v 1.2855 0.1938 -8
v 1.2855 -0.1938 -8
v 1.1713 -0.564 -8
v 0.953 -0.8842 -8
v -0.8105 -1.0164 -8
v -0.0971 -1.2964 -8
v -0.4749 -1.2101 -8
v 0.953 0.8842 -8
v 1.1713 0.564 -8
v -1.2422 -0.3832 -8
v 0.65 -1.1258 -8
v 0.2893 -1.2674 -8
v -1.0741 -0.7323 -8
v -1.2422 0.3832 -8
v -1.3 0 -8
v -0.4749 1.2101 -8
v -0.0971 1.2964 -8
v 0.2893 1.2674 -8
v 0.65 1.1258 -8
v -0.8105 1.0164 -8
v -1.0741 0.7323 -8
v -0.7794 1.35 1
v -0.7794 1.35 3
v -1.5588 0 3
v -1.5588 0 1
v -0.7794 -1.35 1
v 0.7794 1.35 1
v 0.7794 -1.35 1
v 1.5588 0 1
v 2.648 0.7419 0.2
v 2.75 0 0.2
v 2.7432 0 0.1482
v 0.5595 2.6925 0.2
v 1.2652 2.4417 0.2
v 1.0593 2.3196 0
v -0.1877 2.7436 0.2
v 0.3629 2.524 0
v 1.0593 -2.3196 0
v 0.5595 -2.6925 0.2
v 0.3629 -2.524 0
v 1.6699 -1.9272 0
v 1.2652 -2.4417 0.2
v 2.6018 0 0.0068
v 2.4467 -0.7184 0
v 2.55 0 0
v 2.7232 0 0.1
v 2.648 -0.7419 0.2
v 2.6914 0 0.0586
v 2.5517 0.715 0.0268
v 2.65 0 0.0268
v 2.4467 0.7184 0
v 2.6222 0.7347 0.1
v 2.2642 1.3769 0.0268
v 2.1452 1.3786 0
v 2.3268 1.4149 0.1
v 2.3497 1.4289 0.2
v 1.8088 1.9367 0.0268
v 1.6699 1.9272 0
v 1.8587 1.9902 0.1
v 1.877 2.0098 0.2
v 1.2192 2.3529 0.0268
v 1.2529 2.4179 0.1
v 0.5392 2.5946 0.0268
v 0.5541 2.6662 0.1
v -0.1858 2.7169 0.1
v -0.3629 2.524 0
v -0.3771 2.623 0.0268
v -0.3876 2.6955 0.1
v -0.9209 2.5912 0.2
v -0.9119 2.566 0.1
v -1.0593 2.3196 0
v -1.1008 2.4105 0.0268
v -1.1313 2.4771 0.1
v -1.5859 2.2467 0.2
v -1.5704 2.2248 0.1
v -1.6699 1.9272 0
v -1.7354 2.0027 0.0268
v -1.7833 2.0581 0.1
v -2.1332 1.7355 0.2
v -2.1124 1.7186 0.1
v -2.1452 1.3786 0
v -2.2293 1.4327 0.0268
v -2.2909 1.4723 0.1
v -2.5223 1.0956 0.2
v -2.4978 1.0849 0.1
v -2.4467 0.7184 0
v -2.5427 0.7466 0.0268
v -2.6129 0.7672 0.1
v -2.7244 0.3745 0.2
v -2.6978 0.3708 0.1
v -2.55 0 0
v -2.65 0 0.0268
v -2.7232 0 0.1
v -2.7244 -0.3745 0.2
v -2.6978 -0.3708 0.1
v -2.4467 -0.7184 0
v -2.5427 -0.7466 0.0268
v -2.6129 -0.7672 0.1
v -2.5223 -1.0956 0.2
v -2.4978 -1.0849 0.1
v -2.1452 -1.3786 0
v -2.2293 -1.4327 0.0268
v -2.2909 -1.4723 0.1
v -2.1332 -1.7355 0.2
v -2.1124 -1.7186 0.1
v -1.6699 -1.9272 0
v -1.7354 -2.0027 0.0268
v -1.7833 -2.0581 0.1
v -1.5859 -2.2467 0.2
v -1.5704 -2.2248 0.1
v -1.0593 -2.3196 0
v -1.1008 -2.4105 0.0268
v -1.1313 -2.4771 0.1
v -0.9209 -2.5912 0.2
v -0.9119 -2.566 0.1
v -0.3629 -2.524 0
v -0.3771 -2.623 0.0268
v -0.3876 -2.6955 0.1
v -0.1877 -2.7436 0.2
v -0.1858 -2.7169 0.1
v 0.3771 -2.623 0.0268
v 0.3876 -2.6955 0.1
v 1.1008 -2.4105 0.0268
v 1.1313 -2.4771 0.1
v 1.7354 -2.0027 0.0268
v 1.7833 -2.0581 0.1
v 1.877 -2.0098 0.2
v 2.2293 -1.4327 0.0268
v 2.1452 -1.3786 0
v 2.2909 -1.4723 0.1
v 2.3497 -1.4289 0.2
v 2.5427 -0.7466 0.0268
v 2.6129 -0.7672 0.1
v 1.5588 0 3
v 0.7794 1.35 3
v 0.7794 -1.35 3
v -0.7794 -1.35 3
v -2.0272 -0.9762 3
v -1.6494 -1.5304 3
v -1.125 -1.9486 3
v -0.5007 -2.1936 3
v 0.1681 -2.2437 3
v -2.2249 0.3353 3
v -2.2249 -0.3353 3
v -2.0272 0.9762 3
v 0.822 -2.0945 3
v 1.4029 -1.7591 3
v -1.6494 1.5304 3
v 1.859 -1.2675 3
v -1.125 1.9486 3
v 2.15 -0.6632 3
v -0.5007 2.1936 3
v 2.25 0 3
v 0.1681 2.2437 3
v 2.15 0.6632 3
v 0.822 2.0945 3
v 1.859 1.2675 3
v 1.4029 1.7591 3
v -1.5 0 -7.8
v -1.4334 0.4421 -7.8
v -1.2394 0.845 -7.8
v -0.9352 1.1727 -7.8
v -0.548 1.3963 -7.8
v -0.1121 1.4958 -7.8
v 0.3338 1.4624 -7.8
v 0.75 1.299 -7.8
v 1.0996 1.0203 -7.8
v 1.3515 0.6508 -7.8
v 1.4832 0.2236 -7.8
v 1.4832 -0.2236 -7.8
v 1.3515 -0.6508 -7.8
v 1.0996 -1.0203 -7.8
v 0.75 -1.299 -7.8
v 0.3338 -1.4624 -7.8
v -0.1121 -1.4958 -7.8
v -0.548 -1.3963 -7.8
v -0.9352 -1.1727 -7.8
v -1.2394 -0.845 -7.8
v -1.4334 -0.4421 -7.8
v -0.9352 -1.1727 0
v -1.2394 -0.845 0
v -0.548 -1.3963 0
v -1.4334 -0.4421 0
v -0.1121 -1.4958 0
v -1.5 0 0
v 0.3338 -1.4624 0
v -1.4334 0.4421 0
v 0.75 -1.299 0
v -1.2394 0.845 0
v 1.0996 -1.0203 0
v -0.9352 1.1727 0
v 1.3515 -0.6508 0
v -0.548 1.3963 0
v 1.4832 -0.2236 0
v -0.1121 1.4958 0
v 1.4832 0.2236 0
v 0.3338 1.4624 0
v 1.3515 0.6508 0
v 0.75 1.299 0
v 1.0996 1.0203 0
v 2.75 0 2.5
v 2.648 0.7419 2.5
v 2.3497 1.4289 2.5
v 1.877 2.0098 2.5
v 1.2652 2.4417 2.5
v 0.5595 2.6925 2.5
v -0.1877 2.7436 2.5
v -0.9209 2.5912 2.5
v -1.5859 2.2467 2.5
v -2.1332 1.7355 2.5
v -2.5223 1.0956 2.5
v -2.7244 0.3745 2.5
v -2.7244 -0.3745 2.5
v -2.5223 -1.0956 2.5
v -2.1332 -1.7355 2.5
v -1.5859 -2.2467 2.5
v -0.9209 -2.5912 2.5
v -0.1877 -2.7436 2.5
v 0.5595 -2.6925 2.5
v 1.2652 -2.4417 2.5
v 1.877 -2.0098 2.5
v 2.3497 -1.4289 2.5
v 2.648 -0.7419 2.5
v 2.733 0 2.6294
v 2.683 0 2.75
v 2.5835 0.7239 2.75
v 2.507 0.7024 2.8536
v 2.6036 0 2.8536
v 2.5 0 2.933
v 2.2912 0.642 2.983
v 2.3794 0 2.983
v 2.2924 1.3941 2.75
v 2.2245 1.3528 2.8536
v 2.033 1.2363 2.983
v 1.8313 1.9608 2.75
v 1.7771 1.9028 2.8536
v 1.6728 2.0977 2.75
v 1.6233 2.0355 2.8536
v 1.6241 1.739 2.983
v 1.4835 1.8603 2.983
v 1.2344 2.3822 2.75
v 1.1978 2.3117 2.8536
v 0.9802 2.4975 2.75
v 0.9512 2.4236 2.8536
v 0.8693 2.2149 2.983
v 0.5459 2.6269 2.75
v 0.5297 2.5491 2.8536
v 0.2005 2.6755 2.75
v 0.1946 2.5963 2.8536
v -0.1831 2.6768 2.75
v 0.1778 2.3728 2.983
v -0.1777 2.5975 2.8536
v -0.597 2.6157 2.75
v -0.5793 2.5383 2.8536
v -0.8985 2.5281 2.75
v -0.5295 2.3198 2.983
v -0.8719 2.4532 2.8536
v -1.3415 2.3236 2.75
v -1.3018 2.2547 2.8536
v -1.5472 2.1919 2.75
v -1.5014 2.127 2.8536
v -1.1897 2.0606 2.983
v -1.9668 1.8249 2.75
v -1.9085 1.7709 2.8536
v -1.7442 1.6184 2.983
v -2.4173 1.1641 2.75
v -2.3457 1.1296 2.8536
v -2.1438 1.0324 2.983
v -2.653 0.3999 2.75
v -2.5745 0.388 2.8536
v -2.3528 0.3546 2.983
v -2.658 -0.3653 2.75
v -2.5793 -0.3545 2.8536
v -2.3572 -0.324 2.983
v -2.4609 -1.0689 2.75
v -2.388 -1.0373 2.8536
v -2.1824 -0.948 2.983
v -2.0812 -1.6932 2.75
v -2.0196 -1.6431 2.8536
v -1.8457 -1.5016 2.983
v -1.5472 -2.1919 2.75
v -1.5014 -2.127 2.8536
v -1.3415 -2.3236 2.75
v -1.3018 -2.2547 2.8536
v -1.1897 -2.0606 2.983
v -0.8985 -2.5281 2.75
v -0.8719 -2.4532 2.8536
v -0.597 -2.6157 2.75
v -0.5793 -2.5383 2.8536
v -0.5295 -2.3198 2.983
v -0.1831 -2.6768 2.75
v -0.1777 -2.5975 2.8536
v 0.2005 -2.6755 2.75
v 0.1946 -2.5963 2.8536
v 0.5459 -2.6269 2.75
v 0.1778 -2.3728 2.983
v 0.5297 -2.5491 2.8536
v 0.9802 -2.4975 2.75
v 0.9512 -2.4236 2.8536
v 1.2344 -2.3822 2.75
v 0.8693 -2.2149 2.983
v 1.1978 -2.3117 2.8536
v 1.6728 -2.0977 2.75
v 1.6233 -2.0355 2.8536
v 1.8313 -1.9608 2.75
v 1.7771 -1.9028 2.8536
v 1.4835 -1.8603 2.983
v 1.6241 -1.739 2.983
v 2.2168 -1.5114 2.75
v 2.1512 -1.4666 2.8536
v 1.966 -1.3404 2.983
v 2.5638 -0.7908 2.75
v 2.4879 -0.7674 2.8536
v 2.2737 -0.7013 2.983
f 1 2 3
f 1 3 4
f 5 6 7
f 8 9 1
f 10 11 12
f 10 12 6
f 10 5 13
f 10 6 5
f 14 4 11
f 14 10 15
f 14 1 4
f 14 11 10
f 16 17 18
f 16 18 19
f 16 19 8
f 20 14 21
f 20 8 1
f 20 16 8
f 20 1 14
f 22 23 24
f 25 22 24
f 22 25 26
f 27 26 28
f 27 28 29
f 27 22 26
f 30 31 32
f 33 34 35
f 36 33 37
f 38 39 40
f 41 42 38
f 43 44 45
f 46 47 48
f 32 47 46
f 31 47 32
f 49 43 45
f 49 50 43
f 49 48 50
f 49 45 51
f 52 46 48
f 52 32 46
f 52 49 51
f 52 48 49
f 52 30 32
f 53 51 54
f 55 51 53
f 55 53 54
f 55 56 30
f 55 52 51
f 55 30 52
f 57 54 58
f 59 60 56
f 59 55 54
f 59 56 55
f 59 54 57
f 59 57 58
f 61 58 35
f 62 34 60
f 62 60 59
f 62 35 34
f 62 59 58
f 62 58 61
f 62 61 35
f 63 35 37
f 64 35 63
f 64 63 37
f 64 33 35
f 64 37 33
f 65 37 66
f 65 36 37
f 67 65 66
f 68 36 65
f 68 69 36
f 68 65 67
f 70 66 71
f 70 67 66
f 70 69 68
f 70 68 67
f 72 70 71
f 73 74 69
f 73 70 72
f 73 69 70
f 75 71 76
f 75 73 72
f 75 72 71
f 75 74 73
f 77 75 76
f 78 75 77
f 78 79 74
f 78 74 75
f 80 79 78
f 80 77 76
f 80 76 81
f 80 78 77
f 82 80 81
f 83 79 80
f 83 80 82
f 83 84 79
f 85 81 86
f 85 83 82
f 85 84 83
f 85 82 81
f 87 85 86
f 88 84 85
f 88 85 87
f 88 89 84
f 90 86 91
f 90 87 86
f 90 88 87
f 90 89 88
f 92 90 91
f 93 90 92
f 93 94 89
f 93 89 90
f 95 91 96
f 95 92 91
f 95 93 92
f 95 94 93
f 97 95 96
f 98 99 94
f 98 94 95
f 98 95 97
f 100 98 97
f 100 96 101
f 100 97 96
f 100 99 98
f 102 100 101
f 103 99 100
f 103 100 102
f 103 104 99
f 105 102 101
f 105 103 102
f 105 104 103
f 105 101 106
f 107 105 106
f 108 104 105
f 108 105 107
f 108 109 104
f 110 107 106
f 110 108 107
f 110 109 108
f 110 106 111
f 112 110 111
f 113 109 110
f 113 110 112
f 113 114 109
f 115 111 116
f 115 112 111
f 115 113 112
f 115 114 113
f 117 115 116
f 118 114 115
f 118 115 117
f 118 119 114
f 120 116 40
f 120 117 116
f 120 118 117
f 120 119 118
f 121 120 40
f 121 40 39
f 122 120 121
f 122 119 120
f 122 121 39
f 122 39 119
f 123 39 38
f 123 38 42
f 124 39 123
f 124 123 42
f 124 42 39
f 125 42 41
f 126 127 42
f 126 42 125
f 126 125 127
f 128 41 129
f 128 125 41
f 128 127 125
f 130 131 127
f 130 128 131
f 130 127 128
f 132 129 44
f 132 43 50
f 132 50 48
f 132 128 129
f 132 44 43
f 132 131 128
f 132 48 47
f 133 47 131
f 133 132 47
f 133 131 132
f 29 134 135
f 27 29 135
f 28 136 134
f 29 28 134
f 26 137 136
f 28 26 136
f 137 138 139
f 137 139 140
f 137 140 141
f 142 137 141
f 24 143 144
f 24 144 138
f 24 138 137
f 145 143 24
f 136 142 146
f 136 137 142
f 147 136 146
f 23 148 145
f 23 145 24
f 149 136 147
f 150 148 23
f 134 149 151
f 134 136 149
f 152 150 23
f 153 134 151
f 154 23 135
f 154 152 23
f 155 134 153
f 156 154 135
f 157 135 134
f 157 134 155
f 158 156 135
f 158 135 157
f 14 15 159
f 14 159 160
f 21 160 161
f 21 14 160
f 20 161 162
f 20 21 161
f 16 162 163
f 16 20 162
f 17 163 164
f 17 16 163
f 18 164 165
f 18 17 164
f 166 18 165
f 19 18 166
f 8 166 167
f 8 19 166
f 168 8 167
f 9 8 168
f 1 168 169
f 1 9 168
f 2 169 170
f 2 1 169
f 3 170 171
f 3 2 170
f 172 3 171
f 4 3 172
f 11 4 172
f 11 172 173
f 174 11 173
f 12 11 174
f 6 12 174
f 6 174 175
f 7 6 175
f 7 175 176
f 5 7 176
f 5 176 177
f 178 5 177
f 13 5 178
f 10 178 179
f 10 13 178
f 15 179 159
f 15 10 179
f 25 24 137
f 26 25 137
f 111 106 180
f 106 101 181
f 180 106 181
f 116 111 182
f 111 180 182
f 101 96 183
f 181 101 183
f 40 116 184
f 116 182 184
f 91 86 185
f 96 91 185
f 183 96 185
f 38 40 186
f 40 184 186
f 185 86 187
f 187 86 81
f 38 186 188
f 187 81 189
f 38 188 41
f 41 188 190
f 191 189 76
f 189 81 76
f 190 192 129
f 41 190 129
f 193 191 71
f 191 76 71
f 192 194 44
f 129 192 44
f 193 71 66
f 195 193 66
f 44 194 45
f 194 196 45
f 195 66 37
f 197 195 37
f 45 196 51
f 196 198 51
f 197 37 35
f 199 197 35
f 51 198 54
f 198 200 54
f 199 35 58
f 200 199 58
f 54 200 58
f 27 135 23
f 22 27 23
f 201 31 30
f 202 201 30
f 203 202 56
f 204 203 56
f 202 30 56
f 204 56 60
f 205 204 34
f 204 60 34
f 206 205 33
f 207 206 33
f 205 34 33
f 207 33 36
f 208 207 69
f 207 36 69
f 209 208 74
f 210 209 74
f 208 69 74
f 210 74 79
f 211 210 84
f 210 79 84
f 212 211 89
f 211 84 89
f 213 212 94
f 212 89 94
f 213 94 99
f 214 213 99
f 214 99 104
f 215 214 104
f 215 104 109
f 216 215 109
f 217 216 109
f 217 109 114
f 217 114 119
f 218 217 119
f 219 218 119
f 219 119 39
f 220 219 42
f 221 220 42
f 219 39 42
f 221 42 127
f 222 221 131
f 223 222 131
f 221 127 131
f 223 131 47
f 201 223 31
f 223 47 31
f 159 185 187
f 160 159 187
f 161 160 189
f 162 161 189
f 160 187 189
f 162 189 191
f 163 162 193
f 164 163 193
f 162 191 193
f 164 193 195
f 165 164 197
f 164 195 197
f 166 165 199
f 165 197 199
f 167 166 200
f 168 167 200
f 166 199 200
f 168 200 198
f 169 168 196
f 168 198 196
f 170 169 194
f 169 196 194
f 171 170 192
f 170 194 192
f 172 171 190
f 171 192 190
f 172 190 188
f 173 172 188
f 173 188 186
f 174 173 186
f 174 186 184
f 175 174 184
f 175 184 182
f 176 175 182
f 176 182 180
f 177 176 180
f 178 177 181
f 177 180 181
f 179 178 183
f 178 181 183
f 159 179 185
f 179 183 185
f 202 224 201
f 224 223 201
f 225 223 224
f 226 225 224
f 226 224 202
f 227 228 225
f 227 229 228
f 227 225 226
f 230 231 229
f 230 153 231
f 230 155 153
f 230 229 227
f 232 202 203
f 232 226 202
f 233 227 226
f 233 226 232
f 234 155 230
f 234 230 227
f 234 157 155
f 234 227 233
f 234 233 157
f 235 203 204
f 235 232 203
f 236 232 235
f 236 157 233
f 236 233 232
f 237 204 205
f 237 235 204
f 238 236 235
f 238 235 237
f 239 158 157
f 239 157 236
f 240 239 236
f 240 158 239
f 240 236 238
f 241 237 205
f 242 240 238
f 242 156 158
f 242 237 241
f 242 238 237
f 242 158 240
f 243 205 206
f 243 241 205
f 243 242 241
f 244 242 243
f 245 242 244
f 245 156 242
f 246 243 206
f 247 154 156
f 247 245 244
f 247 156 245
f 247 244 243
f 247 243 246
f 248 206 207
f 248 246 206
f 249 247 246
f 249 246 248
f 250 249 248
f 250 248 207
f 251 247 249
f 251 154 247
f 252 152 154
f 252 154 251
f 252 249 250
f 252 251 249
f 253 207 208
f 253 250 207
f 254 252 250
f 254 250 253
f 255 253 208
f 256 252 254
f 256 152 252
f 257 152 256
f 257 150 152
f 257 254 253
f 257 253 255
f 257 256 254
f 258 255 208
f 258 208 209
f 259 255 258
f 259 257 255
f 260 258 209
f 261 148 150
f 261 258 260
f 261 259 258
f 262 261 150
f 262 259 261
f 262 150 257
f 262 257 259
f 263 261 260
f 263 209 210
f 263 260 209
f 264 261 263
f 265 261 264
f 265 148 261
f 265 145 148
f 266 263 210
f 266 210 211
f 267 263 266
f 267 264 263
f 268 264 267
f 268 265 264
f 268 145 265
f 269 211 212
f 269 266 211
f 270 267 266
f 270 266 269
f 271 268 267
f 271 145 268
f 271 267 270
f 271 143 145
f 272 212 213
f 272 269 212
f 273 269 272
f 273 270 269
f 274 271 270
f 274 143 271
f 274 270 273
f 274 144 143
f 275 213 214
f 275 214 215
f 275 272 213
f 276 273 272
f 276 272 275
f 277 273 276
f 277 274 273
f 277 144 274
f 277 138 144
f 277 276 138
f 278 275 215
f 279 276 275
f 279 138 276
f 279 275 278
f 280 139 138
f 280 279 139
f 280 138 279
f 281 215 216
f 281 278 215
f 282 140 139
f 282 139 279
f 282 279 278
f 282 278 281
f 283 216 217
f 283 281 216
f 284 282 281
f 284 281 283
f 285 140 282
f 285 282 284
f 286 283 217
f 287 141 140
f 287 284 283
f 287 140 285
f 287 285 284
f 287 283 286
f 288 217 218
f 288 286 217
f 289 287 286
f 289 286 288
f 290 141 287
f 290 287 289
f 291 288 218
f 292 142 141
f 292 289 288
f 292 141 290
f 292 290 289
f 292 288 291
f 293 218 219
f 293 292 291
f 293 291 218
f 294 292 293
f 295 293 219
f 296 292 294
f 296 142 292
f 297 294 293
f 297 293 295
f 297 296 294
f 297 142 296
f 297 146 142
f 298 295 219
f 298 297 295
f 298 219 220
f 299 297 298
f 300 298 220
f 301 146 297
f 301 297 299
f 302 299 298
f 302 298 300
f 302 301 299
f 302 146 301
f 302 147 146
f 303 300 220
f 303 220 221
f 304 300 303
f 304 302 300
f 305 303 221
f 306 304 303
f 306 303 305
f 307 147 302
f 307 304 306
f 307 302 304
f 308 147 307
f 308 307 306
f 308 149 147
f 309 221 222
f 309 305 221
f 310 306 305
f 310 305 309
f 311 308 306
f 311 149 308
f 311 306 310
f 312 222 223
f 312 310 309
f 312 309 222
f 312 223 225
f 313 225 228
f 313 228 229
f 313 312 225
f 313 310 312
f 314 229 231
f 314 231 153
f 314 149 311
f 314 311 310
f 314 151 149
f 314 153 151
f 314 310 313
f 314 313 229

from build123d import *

# Parameters (mm, degrees)
SKETCH_1_R          = 2.75
EXTRUDE_1_DEPTH     = 3
FILLET_1_R          = 0.5
CUT_EXTRUDE_1_DEPTH = 2
SKETCH_3_R          = 1.5
EXTRUDE_2_DEPTH     = 8
CHAMFER_1_SIZE      = 0.2
FILLET_2_R          = 0.2


with BuildPart() as part:
    # 草图1 → 凸台-拉伸1 (new body)
    with BuildSketch(Plane.XY):
        Circle(SKETCH_1_R)
    extrude(amount=EXTRUDE_1_DEPTH)

    # 圆角1
    fillet_1_edges = [part.edges().sort_by_distance(p)[0] for p in [
        (-2.75, 0, 3),
    ]]
    fillet(fillet_1_edges, radius=FILLET_1_R)

    # 草图2 → 切除-拉伸1 (cut)
    with BuildSketch(Plane.XY.offset(3)):
        Polygon((1.558845727, 0), (0.779422863, 1.35), (-0.779422863, 1.35), (-1.558845727, 0), (-0.779422863, -1.35), (0.779422863, -1.35), align=None)
    extrude(amount=-CUT_EXTRUDE_1_DEPTH, mode=Mode.SUBTRACT)

    # 草图3 → 凸台-拉伸2 (add)
    with BuildSketch(Plane(origin=(0, 0, 0), x_dir=(-1, 0, 0), z_dir=(0, 0, -1))):
        Circle(SKETCH_3_R)
    extrude(amount=EXTRUDE_2_DEPTH)

    # 倒角1
    chamfer_1_edges = [part.edges().sort_by_distance(p)[0] for p in [
        (1.5, 0, -8),
    ]]
    chamfer(chamfer_1_edges, length=CHAMFER_1_SIZE)

    # 圆角2
    fillet_2_edges = [part.edges().sort_by_distance(p)[0] for p in [
        (-2.75, 0, 0),
    ]]
    fillet(fillet_2_edges, radius=FILLET_2_R)


solid = part.part
